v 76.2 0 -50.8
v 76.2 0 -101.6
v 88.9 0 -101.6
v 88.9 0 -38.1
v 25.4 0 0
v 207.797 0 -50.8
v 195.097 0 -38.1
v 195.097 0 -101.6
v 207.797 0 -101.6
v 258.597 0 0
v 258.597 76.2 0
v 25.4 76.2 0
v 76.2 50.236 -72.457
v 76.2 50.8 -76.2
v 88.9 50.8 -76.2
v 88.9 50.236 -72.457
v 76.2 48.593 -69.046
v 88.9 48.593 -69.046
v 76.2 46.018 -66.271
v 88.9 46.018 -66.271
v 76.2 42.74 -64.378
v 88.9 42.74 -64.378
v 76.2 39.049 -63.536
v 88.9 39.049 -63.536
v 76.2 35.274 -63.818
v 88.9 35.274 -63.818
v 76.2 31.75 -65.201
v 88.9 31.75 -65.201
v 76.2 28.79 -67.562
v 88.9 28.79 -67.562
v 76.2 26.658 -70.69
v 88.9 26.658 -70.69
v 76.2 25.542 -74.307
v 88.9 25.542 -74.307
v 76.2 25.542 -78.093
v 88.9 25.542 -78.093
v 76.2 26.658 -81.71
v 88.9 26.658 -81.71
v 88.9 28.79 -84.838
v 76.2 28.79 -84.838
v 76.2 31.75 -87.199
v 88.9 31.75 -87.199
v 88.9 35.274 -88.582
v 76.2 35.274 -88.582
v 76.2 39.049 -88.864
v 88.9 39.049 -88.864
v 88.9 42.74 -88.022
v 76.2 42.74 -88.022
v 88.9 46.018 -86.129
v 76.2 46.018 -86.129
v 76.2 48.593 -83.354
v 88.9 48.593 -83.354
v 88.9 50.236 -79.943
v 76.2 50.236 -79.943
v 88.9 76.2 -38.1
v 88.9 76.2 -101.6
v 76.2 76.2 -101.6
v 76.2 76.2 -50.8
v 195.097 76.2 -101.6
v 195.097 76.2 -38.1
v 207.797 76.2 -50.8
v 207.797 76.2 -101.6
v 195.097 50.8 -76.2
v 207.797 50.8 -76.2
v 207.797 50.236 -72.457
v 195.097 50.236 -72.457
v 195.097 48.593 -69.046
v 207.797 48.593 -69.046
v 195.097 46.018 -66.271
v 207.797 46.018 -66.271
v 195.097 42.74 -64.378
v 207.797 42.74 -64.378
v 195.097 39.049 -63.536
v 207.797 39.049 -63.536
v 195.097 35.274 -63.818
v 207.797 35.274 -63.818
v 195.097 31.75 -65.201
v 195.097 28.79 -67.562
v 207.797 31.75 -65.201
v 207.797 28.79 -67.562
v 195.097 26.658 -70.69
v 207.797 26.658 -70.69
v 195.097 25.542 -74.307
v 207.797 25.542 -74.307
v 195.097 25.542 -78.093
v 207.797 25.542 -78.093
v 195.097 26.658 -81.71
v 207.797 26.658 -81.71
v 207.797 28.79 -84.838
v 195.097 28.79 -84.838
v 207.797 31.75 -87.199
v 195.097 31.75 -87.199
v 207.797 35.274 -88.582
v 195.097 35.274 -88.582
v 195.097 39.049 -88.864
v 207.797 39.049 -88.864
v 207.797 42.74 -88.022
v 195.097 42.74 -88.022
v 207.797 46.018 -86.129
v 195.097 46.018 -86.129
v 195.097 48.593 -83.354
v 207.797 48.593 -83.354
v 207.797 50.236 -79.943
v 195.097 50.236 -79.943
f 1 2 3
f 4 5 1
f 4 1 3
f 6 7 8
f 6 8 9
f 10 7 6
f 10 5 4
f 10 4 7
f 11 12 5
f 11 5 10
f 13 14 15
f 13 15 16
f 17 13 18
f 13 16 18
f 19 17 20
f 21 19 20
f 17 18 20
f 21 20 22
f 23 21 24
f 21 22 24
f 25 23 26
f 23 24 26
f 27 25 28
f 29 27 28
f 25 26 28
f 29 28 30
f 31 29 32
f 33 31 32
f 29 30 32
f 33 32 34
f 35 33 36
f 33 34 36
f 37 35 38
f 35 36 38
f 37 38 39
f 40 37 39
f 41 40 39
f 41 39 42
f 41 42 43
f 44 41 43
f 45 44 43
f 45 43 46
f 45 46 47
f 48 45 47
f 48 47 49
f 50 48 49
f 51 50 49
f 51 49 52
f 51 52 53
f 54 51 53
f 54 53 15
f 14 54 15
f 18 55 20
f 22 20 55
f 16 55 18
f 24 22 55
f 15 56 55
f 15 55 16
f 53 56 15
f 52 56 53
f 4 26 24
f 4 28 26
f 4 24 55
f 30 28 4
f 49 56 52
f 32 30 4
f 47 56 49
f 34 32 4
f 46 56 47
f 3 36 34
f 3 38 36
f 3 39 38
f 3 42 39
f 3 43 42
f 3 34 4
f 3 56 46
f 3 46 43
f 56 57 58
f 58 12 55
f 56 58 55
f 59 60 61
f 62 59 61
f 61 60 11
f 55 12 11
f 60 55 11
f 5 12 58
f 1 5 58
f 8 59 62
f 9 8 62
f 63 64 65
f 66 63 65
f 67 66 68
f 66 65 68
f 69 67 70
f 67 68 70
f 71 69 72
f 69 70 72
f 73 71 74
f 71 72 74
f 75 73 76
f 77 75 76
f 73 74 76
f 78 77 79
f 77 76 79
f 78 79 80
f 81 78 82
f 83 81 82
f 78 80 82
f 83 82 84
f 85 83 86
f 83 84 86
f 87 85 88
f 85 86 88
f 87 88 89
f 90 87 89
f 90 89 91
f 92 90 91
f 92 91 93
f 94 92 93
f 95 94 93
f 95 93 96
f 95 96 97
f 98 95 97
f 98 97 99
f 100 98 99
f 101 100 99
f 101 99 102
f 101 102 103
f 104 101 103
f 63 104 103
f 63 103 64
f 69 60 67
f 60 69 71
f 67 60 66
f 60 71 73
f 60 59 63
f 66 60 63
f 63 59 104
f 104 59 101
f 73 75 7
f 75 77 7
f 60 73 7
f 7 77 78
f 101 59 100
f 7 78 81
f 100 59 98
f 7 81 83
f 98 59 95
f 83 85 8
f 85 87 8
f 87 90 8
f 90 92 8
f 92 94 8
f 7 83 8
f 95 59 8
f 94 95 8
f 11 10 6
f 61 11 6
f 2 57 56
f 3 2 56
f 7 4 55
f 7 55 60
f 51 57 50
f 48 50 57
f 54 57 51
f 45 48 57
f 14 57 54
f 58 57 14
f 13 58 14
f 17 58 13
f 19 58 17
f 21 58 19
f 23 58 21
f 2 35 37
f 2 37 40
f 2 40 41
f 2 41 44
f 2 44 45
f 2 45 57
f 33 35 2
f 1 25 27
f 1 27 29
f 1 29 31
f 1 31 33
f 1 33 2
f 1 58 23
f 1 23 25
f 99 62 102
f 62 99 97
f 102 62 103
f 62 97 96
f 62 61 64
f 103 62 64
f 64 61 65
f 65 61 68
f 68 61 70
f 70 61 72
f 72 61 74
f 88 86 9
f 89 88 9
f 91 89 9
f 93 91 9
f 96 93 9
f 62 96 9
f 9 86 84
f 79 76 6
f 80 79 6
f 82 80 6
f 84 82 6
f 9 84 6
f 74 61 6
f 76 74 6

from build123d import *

# Parameters (mm, degrees)
F0_W        = 283.9974
F0_H        = 76.2
F1_DEPTH    = 50.8
F2_T1_DEPTH = 468.124487366
F3_DEPTH    = 50.8
F4_W        = 106.1974
F4_H        = 76.2
F5_DEPTH    = 63.5
F6_R        = 12.7
F7_DEPTH    = 182.3984


# Not quite as in the source:
# - a fillet or chamfer that OpenCascade refuses, or shapes differently, is made with other operations: its cross-section is extruded or revolved along the edge and cut away or added


with BuildPart() as f1:
    # F0 (on Top) → F1 (new body)
    with BuildSketch(Plane.XY):
        with Locations((141.9987, 38.1)):
            Rectangle(F0_W, F0_H)
    extrude(amount=-F1_DEPTH)

    # F2: chamfer of 76.2 on 2 edges, made by hand

    # F2_s2 → F2_t1 (cut)
    with BuildSketch(Plane.XZ.offset(-272.162243683)):
        Polygon((0, 25.4), (76.2, -50.8), (0, -50.8), align=None)
        Polygon((283.9974, 25.4), (207.7974, -50.8), (283.9974, -50.8), align=None)
    extrude(amount=F2_T1_DEPTH, mode=Mode.SUBTRACT)

    # F3 (add): a face of the model
    f3_faces = [f1.faces().sort_by_distance(p)[0] for p in [
        (141.9987, 38.1, -50.8),
    ]]
    extrude(f3_faces, amount=F3_DEPTH)

    # F4 (on face) → F5 (cut)
    with BuildSketch(Plane(origin=(0, 0, -101.6), x_dir=(1, 0, 0), z_dir=(0, 0, -1))):
        with Locations((141.9987, -38.1)):
            Rectangle(F4_W, F4_H)
    extrude(amount=-F5_DEPTH, mode=Mode.SUBTRACT)

    # F6 (on face) → F7 (cut, through all)
    with BuildSketch(Plane.YZ.offset(207.7974)):
        with Locations((38.1, -76.2)):
            Circle(F6_R)
    extrude(amount=-F7_DEPTH, mode=Mode.SUBTRACT)


solid = f1.part
